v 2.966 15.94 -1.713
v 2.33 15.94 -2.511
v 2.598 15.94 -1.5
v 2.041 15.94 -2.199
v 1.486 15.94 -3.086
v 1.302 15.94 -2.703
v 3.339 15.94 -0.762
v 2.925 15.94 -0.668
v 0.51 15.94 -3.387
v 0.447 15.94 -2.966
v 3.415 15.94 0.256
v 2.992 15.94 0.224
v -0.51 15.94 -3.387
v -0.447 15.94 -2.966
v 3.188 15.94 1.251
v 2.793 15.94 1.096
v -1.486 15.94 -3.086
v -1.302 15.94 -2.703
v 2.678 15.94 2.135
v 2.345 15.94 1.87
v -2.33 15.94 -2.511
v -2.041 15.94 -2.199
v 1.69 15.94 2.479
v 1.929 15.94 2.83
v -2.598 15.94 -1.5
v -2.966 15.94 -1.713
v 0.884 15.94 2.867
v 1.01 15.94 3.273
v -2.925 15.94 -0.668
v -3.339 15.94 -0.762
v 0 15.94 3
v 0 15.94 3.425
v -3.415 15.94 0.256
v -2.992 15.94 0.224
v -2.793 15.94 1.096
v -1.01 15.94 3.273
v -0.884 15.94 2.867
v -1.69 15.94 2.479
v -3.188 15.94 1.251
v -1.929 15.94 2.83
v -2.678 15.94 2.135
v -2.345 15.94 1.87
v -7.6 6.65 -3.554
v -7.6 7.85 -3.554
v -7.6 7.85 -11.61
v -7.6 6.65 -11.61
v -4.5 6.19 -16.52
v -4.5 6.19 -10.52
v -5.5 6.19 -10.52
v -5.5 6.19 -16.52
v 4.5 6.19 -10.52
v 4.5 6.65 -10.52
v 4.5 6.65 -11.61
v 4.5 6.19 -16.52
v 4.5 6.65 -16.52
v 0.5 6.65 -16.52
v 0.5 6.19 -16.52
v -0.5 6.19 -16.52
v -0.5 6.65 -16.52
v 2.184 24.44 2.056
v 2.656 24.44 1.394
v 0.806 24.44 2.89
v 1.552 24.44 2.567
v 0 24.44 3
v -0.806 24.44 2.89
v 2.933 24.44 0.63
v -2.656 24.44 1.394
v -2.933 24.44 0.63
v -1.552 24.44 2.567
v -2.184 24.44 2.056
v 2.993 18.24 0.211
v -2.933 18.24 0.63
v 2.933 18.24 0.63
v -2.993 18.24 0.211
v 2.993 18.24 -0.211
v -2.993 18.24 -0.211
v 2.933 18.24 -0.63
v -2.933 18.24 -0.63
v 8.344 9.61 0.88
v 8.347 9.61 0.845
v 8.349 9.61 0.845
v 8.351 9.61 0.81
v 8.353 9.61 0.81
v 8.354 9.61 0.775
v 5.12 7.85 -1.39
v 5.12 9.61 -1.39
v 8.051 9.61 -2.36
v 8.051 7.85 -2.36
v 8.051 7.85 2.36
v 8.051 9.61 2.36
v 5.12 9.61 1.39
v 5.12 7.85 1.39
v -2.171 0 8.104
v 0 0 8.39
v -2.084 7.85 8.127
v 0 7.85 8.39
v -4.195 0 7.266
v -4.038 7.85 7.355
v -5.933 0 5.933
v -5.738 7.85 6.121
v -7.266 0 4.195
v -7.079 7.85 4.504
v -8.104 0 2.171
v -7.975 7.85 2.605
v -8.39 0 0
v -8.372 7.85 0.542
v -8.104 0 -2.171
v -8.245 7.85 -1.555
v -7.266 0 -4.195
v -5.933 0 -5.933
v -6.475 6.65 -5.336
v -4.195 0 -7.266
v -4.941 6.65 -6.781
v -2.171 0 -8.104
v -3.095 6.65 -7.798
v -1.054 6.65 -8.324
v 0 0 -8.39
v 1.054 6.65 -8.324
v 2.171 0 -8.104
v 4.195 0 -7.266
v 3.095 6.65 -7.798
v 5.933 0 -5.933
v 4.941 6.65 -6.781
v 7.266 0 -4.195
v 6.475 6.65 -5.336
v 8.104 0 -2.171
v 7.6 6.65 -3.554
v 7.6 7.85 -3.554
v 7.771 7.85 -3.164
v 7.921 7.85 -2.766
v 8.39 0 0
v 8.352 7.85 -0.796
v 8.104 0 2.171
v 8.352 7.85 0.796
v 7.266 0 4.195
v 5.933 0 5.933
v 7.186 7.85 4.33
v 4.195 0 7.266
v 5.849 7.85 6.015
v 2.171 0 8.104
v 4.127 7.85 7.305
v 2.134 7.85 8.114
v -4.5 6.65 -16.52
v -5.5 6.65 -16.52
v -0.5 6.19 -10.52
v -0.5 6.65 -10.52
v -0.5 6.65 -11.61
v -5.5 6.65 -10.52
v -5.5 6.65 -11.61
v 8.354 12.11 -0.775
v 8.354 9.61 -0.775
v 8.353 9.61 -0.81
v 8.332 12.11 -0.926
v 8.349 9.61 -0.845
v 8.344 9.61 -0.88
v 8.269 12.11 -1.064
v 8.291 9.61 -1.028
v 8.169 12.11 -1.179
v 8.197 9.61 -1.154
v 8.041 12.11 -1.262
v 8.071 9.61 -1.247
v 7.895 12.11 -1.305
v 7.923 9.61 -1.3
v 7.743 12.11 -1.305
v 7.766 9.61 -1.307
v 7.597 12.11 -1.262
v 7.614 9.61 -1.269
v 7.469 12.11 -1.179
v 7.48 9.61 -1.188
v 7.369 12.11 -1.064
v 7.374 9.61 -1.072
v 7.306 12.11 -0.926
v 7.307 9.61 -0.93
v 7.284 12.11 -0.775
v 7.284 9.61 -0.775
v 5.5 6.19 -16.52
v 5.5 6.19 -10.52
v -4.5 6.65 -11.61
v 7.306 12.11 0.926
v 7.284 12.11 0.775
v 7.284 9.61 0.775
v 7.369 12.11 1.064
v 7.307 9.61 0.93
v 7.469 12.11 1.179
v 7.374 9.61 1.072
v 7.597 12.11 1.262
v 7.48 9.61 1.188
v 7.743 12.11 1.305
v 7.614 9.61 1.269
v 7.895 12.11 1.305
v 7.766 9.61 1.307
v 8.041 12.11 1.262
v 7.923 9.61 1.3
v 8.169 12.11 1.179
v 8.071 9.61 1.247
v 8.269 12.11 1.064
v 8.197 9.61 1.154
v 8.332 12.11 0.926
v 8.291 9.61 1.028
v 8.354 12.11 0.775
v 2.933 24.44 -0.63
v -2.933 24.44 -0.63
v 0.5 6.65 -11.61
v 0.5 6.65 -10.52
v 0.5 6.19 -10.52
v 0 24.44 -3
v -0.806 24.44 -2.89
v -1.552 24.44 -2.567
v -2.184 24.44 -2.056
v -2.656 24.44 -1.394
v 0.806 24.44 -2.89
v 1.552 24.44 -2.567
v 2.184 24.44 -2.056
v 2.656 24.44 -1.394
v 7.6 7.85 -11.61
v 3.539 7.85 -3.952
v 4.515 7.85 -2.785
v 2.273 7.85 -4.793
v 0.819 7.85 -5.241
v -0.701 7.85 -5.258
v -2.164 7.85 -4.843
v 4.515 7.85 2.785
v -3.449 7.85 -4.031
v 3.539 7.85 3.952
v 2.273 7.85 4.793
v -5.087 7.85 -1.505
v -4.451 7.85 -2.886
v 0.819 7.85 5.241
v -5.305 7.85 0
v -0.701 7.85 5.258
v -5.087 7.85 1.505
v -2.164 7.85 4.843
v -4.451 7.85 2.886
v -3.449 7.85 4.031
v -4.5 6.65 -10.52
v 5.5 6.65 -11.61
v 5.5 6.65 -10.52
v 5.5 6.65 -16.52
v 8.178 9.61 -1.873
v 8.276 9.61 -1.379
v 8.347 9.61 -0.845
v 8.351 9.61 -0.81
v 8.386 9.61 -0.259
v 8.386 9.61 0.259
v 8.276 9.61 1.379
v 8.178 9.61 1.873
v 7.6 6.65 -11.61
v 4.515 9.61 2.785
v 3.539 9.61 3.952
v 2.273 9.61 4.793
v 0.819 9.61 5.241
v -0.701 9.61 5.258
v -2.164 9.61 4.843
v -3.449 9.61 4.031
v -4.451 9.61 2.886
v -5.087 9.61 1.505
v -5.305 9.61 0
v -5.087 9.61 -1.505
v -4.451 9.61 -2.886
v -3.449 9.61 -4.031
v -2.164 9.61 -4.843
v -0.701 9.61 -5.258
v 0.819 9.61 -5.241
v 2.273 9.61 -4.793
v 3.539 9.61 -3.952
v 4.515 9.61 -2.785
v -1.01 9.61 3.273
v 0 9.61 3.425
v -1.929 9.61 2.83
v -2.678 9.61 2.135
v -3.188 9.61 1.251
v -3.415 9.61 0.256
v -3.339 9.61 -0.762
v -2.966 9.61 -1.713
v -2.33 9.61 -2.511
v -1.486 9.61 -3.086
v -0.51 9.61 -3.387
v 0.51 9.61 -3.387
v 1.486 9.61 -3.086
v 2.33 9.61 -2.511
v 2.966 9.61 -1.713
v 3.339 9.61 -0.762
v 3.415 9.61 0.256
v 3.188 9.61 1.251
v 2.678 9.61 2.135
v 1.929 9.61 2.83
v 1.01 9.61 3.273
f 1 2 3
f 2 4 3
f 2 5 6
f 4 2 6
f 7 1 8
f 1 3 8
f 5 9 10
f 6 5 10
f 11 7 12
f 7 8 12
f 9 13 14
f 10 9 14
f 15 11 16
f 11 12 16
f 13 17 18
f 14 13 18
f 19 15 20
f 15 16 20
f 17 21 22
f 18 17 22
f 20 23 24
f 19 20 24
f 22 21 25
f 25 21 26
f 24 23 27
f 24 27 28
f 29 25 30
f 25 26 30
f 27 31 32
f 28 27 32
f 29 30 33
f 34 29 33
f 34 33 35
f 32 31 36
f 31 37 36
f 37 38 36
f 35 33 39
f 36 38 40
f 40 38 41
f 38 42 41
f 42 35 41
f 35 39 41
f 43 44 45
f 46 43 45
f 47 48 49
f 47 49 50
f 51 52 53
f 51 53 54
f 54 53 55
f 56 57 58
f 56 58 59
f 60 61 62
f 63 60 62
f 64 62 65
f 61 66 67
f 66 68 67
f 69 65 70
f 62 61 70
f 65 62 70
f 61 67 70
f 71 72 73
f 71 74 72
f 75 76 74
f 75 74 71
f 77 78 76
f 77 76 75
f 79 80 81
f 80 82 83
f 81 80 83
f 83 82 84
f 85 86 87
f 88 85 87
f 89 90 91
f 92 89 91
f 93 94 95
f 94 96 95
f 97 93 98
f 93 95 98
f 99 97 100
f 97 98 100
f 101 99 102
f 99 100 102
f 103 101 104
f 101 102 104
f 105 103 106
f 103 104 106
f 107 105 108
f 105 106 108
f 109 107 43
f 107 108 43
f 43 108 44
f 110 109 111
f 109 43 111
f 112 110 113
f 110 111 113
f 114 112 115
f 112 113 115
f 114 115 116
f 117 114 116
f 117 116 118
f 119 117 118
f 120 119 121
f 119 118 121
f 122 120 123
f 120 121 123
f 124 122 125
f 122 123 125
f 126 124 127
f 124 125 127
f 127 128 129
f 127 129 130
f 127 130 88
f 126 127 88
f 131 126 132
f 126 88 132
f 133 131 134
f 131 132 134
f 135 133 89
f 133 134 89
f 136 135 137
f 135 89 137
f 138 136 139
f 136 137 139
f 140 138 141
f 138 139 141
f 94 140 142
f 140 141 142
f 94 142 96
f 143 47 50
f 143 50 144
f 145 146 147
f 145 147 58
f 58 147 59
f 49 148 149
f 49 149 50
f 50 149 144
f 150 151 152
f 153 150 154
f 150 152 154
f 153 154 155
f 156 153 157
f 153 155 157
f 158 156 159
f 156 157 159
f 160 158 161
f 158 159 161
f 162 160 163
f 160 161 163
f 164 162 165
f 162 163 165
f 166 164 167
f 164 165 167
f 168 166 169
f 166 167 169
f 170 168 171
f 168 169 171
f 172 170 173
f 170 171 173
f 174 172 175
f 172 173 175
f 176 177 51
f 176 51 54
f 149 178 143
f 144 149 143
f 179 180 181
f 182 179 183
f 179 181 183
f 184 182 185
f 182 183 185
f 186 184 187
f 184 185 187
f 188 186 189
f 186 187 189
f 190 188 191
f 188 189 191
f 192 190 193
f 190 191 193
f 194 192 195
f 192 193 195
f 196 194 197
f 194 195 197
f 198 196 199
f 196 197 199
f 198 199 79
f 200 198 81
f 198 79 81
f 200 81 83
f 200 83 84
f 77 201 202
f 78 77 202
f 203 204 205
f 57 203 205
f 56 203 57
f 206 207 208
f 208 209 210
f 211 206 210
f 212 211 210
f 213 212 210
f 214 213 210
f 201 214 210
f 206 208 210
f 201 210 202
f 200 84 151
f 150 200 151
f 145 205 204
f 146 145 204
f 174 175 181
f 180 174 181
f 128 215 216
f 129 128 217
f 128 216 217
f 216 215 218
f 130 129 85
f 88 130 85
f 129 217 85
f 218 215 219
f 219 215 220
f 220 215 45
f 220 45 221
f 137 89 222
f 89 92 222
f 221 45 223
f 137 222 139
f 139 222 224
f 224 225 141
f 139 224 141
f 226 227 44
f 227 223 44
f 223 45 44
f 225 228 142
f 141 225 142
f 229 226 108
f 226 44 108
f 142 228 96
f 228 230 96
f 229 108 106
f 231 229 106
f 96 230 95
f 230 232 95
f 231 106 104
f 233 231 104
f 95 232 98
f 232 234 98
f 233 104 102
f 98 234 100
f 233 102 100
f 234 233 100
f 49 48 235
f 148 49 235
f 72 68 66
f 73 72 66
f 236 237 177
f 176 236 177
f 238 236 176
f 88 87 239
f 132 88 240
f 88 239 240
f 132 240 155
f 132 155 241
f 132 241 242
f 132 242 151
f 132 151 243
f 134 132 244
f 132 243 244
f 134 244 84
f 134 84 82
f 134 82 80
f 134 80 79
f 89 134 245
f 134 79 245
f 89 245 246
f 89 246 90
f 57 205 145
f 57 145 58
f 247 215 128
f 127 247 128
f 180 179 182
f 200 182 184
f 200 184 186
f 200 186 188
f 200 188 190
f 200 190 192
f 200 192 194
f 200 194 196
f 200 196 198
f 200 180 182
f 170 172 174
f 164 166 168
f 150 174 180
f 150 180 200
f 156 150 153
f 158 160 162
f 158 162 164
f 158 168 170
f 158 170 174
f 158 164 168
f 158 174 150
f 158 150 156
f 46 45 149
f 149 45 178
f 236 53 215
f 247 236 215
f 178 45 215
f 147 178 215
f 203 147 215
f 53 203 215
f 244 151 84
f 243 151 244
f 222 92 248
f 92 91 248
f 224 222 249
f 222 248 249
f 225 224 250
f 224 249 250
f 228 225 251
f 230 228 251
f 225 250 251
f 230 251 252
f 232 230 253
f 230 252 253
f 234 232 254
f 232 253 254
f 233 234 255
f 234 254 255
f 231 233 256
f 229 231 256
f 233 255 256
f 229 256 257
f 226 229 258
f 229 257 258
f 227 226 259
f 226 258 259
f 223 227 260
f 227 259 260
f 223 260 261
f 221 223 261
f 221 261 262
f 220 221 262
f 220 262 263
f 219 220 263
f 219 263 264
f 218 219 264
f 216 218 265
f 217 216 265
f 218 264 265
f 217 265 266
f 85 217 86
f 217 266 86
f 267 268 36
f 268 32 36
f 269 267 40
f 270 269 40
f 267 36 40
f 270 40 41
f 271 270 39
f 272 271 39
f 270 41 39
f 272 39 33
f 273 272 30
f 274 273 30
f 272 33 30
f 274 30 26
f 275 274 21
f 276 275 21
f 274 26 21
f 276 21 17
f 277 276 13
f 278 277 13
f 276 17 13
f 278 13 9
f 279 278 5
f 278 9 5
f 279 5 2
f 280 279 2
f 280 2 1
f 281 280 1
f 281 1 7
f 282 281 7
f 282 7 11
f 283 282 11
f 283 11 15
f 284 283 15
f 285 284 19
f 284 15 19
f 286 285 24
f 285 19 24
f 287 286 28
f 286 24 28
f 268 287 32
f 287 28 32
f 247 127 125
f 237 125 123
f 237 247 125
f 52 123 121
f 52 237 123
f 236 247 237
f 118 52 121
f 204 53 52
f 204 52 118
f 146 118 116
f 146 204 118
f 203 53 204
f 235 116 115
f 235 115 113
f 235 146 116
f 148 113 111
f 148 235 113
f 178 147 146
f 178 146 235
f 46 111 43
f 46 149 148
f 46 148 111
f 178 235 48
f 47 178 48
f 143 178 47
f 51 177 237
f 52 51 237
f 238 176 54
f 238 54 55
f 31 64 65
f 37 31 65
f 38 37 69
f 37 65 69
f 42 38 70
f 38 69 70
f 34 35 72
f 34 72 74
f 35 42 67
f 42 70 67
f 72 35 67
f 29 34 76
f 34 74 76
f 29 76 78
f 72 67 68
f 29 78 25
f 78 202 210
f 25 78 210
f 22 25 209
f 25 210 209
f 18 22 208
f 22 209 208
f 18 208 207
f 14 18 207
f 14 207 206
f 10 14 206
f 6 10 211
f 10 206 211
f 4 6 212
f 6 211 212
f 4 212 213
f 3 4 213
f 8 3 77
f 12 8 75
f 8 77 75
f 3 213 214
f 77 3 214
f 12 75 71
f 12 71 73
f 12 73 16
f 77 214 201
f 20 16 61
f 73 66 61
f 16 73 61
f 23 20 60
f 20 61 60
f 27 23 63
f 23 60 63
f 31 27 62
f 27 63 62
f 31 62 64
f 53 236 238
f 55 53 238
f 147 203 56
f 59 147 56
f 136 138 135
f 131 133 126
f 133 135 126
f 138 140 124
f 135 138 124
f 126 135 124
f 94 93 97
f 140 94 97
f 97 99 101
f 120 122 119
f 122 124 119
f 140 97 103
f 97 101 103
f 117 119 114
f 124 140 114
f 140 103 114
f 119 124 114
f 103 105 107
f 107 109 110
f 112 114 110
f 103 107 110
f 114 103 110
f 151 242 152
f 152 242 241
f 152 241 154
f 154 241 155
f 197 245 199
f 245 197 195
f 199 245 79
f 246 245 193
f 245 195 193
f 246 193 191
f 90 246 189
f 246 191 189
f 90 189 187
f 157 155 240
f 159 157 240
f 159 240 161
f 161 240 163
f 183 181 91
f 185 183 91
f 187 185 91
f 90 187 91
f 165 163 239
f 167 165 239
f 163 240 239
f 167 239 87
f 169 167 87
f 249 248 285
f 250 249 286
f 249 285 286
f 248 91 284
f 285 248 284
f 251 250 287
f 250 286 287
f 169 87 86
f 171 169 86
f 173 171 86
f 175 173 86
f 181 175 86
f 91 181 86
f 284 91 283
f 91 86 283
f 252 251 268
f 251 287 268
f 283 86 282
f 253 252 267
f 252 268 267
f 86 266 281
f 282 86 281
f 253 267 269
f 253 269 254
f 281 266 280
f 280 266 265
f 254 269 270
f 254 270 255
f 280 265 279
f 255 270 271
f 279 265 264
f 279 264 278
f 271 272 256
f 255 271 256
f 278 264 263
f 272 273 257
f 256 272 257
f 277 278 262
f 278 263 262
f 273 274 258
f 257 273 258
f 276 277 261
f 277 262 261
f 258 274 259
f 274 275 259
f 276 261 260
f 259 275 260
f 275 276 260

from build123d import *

# Parameters (mm, degrees)
CUT_EXTRUDE1_DEPTH  = 6.2
BOSS_EXTRUDE1_DEPTH = 1.2
SKETCH5_W           = 6
SKETCH5_H           = 0.46
BOSS_EXTRUDE2_DEPTH = 0.5
LPATTERN1_COUNT     = 2
LPATTERN1_PITCH     = 5
LPATTERN1_COL_COUNT = 2
LPATTERN1_COL_PITCH = 5
BOSS_EXTRUDE3_START = 1.76
BOSS_EXTRUDE3_DEPTH = 1.76
BOSS_EXTRUDE4_DEPTH = 2.5


# Read off the part's stored shape, not the designer's step: Boss-Extrude4
with BuildPart() as part:
    # Sketch1 → Revolve1 (revolve)
    with BuildSketch(Plane(origin=(0, 0, 0), x_dir=(0, 0, -1), z_dir=(1, 0, 0))):
        Polygon((0, 0), (-8.39, 0), (-8.39, 7.85), (-5.305, 7.85), (-5.305, 9.61), (-3.425, 9.61), (-3.425, 15.94), (-3, 15.94), (-3, 24.44), (0, 24.44), align=None)
    revolve(axis=Axis((0, 0, 0), (0, -1, 0)))

    # Sketch3 → Cut-Extrude1 (cut)
    with BuildSketch(Plane(origin=(0, 24.44, 0), x_dir=(1, 0, 0), z_dir=(0, 1, 0))):
        with BuildLine():
            Line((-2.933104158, -0.63), (2.933104158, -0.63))
            ThreePointArc((2.933104158, -0.63), (3, 0), (2.933104158, 0.63))
            Line((2.933104158, 0.63), (-2.933104158, 0.63))
            ThreePointArc((-2.933104158, 0.63), (-3, 0), (-2.933104158, -0.63))
        make_face()
    extrude(amount=-CUT_EXTRUDE1_DEPTH, mode=Mode.SUBTRACT)

    # Sketch4 → Boss-Extrude1 (add)
    with BuildSketch(Plane(origin=(0, 7.85, 0), x_dir=(1, 0, 0), z_dir=(0, 1, 0))):
        with BuildLine():
            Line((-7.6, 3.554166569), (-7.6, 11.61))
            Line((-7.6, 11.61), (7.6, 11.61))
            Line((7.6, 11.61), (7.6, 3.554166569))
            ThreePointArc((7.6, 3.554166569), (0, 8.39), (-7.6, 3.554166569))
        make_face()
    extrude(amount=-BOSS_EXTRUDE1_DEPTH)

    # Sketch5 → Boss-Extrude2 (add, symmetric)
    with BuildSketch(Plane(origin=(0, 0, 0), x_dir=(0, 0, -1), z_dir=(1, 0, 0))):
        with Locations((13.52, 6.42)):
            Rectangle(SKETCH5_W, SKETCH5_H)
    boss_extrude2 = extrude(amount=BOSS_EXTRUDE2_DEPTH, both=True)

    # LPattern1: Boss-Extrude2 ×2
    with Locations(*[(i * LPATTERN1_PITCH, 0, 0) for i in range(1, LPATTERN1_COUNT)]):
        add(boss_extrude2)

    # LPattern1 col: Boss-Extrude2 ×2
    with Locations(*[(-i * LPATTERN1_COL_PITCH, 0, 0) for i in range(1, LPATTERN1_COL_COUNT)]):
        add(boss_extrude2)

    # Sketch6 → Boss-Extrude3 (add)
    with BuildSketch(Plane(origin=(0, 7.85, 0), x_dir=(1, 0, 0), z_dir=(0, 1, 0)).offset(BOSS_EXTRUDE3_START)):
        with BuildLine():
            Line((5.119660633, 1.39), (8.05124214, 2.36))
            ThreePointArc((8.05124214, 2.36), (8.39, 0), (8.05124214, -2.36))
            Line((8.05124214, -2.36), (5.119660633, -1.39))
            ThreePointArc((5.119660633, -1.39), (5.305, 0), (5.119660633, 1.39))
        make_face()
    extrude(amount=-BOSS_EXTRUDE3_DEPTH)

    # Boss-Extrude4 outline → Boss-Extrude4 (add)
    with BuildSketch(Plane(origin=(0, 9.61, 0), x_dir=(1, 0, 0), z_dir=(0, 1, 0))):
        with BuildLine():
            ThreePointArc((8.354129219, 0.775), (7.819129219, 1.31), (7.284129219, 0.775))
            Line((7.284129219, 0.775), (7.284129219, -0.775))
            ThreePointArc((7.284129219, -0.775), (7.819129219, -1.31), (8.354129219, -0.775))
            Line((8.354129219, -0.775), (8.354129219, 0.775))
        make_face()
    extrude(amount=BOSS_EXTRUDE4_DEPTH)


solid = part.part
